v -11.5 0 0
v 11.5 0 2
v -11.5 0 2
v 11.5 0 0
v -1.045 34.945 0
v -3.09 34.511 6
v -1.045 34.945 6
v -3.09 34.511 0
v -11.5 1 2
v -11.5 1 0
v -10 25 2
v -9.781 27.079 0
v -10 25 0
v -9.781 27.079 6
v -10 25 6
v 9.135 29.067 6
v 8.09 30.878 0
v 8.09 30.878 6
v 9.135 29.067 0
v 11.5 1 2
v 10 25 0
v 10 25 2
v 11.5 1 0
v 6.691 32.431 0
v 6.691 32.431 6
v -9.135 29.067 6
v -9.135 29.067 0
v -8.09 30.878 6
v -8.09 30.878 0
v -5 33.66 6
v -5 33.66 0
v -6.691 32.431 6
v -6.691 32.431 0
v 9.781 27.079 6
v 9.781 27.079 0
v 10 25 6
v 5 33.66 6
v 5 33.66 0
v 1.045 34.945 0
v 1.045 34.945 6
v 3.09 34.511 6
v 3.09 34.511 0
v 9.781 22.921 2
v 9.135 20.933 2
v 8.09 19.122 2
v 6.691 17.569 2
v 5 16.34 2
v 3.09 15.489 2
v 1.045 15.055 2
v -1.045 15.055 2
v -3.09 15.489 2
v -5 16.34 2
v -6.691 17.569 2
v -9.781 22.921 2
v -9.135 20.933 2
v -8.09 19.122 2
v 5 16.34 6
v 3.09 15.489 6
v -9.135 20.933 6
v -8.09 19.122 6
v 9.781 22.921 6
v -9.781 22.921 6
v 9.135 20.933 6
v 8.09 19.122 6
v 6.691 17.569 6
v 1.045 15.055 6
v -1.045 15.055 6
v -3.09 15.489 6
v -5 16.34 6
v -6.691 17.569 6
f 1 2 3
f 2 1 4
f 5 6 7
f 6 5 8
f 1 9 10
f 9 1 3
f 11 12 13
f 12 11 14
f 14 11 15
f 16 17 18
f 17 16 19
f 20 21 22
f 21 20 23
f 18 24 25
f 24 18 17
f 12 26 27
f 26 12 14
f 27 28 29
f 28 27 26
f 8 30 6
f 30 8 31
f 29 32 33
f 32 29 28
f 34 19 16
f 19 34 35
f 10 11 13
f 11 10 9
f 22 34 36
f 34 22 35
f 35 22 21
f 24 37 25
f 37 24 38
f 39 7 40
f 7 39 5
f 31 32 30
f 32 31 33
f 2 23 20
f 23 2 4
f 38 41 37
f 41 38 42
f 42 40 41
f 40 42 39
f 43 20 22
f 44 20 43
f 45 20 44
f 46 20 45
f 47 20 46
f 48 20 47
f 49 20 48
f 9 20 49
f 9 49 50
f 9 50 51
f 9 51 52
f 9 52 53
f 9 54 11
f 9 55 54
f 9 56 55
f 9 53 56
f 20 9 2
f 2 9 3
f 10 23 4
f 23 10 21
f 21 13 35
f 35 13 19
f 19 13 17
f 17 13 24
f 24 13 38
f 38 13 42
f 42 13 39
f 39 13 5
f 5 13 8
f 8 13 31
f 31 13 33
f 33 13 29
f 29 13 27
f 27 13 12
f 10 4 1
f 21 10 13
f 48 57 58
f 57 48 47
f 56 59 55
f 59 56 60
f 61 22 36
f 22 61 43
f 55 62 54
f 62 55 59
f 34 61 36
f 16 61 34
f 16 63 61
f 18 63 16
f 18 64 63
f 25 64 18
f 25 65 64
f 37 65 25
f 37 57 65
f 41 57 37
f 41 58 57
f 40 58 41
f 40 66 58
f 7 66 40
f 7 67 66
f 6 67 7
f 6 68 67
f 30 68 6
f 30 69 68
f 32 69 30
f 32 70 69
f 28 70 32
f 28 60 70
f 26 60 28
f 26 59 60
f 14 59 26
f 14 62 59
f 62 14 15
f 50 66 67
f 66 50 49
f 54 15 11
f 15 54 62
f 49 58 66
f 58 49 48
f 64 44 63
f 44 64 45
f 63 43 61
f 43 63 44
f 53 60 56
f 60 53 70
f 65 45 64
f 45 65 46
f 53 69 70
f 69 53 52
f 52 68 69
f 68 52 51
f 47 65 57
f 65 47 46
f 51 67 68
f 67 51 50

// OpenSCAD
height=6;
rear_offset=25; // From diagonal edge to center of tire



hull() {	
	translate([-23/2,0,0]) cube([23,1,2]);
	translate([0,rear_offset,0]) cylinder(r=10,h=2);
}
translate([0,rear_offset,0]) cylinder(r=10,h=height);
